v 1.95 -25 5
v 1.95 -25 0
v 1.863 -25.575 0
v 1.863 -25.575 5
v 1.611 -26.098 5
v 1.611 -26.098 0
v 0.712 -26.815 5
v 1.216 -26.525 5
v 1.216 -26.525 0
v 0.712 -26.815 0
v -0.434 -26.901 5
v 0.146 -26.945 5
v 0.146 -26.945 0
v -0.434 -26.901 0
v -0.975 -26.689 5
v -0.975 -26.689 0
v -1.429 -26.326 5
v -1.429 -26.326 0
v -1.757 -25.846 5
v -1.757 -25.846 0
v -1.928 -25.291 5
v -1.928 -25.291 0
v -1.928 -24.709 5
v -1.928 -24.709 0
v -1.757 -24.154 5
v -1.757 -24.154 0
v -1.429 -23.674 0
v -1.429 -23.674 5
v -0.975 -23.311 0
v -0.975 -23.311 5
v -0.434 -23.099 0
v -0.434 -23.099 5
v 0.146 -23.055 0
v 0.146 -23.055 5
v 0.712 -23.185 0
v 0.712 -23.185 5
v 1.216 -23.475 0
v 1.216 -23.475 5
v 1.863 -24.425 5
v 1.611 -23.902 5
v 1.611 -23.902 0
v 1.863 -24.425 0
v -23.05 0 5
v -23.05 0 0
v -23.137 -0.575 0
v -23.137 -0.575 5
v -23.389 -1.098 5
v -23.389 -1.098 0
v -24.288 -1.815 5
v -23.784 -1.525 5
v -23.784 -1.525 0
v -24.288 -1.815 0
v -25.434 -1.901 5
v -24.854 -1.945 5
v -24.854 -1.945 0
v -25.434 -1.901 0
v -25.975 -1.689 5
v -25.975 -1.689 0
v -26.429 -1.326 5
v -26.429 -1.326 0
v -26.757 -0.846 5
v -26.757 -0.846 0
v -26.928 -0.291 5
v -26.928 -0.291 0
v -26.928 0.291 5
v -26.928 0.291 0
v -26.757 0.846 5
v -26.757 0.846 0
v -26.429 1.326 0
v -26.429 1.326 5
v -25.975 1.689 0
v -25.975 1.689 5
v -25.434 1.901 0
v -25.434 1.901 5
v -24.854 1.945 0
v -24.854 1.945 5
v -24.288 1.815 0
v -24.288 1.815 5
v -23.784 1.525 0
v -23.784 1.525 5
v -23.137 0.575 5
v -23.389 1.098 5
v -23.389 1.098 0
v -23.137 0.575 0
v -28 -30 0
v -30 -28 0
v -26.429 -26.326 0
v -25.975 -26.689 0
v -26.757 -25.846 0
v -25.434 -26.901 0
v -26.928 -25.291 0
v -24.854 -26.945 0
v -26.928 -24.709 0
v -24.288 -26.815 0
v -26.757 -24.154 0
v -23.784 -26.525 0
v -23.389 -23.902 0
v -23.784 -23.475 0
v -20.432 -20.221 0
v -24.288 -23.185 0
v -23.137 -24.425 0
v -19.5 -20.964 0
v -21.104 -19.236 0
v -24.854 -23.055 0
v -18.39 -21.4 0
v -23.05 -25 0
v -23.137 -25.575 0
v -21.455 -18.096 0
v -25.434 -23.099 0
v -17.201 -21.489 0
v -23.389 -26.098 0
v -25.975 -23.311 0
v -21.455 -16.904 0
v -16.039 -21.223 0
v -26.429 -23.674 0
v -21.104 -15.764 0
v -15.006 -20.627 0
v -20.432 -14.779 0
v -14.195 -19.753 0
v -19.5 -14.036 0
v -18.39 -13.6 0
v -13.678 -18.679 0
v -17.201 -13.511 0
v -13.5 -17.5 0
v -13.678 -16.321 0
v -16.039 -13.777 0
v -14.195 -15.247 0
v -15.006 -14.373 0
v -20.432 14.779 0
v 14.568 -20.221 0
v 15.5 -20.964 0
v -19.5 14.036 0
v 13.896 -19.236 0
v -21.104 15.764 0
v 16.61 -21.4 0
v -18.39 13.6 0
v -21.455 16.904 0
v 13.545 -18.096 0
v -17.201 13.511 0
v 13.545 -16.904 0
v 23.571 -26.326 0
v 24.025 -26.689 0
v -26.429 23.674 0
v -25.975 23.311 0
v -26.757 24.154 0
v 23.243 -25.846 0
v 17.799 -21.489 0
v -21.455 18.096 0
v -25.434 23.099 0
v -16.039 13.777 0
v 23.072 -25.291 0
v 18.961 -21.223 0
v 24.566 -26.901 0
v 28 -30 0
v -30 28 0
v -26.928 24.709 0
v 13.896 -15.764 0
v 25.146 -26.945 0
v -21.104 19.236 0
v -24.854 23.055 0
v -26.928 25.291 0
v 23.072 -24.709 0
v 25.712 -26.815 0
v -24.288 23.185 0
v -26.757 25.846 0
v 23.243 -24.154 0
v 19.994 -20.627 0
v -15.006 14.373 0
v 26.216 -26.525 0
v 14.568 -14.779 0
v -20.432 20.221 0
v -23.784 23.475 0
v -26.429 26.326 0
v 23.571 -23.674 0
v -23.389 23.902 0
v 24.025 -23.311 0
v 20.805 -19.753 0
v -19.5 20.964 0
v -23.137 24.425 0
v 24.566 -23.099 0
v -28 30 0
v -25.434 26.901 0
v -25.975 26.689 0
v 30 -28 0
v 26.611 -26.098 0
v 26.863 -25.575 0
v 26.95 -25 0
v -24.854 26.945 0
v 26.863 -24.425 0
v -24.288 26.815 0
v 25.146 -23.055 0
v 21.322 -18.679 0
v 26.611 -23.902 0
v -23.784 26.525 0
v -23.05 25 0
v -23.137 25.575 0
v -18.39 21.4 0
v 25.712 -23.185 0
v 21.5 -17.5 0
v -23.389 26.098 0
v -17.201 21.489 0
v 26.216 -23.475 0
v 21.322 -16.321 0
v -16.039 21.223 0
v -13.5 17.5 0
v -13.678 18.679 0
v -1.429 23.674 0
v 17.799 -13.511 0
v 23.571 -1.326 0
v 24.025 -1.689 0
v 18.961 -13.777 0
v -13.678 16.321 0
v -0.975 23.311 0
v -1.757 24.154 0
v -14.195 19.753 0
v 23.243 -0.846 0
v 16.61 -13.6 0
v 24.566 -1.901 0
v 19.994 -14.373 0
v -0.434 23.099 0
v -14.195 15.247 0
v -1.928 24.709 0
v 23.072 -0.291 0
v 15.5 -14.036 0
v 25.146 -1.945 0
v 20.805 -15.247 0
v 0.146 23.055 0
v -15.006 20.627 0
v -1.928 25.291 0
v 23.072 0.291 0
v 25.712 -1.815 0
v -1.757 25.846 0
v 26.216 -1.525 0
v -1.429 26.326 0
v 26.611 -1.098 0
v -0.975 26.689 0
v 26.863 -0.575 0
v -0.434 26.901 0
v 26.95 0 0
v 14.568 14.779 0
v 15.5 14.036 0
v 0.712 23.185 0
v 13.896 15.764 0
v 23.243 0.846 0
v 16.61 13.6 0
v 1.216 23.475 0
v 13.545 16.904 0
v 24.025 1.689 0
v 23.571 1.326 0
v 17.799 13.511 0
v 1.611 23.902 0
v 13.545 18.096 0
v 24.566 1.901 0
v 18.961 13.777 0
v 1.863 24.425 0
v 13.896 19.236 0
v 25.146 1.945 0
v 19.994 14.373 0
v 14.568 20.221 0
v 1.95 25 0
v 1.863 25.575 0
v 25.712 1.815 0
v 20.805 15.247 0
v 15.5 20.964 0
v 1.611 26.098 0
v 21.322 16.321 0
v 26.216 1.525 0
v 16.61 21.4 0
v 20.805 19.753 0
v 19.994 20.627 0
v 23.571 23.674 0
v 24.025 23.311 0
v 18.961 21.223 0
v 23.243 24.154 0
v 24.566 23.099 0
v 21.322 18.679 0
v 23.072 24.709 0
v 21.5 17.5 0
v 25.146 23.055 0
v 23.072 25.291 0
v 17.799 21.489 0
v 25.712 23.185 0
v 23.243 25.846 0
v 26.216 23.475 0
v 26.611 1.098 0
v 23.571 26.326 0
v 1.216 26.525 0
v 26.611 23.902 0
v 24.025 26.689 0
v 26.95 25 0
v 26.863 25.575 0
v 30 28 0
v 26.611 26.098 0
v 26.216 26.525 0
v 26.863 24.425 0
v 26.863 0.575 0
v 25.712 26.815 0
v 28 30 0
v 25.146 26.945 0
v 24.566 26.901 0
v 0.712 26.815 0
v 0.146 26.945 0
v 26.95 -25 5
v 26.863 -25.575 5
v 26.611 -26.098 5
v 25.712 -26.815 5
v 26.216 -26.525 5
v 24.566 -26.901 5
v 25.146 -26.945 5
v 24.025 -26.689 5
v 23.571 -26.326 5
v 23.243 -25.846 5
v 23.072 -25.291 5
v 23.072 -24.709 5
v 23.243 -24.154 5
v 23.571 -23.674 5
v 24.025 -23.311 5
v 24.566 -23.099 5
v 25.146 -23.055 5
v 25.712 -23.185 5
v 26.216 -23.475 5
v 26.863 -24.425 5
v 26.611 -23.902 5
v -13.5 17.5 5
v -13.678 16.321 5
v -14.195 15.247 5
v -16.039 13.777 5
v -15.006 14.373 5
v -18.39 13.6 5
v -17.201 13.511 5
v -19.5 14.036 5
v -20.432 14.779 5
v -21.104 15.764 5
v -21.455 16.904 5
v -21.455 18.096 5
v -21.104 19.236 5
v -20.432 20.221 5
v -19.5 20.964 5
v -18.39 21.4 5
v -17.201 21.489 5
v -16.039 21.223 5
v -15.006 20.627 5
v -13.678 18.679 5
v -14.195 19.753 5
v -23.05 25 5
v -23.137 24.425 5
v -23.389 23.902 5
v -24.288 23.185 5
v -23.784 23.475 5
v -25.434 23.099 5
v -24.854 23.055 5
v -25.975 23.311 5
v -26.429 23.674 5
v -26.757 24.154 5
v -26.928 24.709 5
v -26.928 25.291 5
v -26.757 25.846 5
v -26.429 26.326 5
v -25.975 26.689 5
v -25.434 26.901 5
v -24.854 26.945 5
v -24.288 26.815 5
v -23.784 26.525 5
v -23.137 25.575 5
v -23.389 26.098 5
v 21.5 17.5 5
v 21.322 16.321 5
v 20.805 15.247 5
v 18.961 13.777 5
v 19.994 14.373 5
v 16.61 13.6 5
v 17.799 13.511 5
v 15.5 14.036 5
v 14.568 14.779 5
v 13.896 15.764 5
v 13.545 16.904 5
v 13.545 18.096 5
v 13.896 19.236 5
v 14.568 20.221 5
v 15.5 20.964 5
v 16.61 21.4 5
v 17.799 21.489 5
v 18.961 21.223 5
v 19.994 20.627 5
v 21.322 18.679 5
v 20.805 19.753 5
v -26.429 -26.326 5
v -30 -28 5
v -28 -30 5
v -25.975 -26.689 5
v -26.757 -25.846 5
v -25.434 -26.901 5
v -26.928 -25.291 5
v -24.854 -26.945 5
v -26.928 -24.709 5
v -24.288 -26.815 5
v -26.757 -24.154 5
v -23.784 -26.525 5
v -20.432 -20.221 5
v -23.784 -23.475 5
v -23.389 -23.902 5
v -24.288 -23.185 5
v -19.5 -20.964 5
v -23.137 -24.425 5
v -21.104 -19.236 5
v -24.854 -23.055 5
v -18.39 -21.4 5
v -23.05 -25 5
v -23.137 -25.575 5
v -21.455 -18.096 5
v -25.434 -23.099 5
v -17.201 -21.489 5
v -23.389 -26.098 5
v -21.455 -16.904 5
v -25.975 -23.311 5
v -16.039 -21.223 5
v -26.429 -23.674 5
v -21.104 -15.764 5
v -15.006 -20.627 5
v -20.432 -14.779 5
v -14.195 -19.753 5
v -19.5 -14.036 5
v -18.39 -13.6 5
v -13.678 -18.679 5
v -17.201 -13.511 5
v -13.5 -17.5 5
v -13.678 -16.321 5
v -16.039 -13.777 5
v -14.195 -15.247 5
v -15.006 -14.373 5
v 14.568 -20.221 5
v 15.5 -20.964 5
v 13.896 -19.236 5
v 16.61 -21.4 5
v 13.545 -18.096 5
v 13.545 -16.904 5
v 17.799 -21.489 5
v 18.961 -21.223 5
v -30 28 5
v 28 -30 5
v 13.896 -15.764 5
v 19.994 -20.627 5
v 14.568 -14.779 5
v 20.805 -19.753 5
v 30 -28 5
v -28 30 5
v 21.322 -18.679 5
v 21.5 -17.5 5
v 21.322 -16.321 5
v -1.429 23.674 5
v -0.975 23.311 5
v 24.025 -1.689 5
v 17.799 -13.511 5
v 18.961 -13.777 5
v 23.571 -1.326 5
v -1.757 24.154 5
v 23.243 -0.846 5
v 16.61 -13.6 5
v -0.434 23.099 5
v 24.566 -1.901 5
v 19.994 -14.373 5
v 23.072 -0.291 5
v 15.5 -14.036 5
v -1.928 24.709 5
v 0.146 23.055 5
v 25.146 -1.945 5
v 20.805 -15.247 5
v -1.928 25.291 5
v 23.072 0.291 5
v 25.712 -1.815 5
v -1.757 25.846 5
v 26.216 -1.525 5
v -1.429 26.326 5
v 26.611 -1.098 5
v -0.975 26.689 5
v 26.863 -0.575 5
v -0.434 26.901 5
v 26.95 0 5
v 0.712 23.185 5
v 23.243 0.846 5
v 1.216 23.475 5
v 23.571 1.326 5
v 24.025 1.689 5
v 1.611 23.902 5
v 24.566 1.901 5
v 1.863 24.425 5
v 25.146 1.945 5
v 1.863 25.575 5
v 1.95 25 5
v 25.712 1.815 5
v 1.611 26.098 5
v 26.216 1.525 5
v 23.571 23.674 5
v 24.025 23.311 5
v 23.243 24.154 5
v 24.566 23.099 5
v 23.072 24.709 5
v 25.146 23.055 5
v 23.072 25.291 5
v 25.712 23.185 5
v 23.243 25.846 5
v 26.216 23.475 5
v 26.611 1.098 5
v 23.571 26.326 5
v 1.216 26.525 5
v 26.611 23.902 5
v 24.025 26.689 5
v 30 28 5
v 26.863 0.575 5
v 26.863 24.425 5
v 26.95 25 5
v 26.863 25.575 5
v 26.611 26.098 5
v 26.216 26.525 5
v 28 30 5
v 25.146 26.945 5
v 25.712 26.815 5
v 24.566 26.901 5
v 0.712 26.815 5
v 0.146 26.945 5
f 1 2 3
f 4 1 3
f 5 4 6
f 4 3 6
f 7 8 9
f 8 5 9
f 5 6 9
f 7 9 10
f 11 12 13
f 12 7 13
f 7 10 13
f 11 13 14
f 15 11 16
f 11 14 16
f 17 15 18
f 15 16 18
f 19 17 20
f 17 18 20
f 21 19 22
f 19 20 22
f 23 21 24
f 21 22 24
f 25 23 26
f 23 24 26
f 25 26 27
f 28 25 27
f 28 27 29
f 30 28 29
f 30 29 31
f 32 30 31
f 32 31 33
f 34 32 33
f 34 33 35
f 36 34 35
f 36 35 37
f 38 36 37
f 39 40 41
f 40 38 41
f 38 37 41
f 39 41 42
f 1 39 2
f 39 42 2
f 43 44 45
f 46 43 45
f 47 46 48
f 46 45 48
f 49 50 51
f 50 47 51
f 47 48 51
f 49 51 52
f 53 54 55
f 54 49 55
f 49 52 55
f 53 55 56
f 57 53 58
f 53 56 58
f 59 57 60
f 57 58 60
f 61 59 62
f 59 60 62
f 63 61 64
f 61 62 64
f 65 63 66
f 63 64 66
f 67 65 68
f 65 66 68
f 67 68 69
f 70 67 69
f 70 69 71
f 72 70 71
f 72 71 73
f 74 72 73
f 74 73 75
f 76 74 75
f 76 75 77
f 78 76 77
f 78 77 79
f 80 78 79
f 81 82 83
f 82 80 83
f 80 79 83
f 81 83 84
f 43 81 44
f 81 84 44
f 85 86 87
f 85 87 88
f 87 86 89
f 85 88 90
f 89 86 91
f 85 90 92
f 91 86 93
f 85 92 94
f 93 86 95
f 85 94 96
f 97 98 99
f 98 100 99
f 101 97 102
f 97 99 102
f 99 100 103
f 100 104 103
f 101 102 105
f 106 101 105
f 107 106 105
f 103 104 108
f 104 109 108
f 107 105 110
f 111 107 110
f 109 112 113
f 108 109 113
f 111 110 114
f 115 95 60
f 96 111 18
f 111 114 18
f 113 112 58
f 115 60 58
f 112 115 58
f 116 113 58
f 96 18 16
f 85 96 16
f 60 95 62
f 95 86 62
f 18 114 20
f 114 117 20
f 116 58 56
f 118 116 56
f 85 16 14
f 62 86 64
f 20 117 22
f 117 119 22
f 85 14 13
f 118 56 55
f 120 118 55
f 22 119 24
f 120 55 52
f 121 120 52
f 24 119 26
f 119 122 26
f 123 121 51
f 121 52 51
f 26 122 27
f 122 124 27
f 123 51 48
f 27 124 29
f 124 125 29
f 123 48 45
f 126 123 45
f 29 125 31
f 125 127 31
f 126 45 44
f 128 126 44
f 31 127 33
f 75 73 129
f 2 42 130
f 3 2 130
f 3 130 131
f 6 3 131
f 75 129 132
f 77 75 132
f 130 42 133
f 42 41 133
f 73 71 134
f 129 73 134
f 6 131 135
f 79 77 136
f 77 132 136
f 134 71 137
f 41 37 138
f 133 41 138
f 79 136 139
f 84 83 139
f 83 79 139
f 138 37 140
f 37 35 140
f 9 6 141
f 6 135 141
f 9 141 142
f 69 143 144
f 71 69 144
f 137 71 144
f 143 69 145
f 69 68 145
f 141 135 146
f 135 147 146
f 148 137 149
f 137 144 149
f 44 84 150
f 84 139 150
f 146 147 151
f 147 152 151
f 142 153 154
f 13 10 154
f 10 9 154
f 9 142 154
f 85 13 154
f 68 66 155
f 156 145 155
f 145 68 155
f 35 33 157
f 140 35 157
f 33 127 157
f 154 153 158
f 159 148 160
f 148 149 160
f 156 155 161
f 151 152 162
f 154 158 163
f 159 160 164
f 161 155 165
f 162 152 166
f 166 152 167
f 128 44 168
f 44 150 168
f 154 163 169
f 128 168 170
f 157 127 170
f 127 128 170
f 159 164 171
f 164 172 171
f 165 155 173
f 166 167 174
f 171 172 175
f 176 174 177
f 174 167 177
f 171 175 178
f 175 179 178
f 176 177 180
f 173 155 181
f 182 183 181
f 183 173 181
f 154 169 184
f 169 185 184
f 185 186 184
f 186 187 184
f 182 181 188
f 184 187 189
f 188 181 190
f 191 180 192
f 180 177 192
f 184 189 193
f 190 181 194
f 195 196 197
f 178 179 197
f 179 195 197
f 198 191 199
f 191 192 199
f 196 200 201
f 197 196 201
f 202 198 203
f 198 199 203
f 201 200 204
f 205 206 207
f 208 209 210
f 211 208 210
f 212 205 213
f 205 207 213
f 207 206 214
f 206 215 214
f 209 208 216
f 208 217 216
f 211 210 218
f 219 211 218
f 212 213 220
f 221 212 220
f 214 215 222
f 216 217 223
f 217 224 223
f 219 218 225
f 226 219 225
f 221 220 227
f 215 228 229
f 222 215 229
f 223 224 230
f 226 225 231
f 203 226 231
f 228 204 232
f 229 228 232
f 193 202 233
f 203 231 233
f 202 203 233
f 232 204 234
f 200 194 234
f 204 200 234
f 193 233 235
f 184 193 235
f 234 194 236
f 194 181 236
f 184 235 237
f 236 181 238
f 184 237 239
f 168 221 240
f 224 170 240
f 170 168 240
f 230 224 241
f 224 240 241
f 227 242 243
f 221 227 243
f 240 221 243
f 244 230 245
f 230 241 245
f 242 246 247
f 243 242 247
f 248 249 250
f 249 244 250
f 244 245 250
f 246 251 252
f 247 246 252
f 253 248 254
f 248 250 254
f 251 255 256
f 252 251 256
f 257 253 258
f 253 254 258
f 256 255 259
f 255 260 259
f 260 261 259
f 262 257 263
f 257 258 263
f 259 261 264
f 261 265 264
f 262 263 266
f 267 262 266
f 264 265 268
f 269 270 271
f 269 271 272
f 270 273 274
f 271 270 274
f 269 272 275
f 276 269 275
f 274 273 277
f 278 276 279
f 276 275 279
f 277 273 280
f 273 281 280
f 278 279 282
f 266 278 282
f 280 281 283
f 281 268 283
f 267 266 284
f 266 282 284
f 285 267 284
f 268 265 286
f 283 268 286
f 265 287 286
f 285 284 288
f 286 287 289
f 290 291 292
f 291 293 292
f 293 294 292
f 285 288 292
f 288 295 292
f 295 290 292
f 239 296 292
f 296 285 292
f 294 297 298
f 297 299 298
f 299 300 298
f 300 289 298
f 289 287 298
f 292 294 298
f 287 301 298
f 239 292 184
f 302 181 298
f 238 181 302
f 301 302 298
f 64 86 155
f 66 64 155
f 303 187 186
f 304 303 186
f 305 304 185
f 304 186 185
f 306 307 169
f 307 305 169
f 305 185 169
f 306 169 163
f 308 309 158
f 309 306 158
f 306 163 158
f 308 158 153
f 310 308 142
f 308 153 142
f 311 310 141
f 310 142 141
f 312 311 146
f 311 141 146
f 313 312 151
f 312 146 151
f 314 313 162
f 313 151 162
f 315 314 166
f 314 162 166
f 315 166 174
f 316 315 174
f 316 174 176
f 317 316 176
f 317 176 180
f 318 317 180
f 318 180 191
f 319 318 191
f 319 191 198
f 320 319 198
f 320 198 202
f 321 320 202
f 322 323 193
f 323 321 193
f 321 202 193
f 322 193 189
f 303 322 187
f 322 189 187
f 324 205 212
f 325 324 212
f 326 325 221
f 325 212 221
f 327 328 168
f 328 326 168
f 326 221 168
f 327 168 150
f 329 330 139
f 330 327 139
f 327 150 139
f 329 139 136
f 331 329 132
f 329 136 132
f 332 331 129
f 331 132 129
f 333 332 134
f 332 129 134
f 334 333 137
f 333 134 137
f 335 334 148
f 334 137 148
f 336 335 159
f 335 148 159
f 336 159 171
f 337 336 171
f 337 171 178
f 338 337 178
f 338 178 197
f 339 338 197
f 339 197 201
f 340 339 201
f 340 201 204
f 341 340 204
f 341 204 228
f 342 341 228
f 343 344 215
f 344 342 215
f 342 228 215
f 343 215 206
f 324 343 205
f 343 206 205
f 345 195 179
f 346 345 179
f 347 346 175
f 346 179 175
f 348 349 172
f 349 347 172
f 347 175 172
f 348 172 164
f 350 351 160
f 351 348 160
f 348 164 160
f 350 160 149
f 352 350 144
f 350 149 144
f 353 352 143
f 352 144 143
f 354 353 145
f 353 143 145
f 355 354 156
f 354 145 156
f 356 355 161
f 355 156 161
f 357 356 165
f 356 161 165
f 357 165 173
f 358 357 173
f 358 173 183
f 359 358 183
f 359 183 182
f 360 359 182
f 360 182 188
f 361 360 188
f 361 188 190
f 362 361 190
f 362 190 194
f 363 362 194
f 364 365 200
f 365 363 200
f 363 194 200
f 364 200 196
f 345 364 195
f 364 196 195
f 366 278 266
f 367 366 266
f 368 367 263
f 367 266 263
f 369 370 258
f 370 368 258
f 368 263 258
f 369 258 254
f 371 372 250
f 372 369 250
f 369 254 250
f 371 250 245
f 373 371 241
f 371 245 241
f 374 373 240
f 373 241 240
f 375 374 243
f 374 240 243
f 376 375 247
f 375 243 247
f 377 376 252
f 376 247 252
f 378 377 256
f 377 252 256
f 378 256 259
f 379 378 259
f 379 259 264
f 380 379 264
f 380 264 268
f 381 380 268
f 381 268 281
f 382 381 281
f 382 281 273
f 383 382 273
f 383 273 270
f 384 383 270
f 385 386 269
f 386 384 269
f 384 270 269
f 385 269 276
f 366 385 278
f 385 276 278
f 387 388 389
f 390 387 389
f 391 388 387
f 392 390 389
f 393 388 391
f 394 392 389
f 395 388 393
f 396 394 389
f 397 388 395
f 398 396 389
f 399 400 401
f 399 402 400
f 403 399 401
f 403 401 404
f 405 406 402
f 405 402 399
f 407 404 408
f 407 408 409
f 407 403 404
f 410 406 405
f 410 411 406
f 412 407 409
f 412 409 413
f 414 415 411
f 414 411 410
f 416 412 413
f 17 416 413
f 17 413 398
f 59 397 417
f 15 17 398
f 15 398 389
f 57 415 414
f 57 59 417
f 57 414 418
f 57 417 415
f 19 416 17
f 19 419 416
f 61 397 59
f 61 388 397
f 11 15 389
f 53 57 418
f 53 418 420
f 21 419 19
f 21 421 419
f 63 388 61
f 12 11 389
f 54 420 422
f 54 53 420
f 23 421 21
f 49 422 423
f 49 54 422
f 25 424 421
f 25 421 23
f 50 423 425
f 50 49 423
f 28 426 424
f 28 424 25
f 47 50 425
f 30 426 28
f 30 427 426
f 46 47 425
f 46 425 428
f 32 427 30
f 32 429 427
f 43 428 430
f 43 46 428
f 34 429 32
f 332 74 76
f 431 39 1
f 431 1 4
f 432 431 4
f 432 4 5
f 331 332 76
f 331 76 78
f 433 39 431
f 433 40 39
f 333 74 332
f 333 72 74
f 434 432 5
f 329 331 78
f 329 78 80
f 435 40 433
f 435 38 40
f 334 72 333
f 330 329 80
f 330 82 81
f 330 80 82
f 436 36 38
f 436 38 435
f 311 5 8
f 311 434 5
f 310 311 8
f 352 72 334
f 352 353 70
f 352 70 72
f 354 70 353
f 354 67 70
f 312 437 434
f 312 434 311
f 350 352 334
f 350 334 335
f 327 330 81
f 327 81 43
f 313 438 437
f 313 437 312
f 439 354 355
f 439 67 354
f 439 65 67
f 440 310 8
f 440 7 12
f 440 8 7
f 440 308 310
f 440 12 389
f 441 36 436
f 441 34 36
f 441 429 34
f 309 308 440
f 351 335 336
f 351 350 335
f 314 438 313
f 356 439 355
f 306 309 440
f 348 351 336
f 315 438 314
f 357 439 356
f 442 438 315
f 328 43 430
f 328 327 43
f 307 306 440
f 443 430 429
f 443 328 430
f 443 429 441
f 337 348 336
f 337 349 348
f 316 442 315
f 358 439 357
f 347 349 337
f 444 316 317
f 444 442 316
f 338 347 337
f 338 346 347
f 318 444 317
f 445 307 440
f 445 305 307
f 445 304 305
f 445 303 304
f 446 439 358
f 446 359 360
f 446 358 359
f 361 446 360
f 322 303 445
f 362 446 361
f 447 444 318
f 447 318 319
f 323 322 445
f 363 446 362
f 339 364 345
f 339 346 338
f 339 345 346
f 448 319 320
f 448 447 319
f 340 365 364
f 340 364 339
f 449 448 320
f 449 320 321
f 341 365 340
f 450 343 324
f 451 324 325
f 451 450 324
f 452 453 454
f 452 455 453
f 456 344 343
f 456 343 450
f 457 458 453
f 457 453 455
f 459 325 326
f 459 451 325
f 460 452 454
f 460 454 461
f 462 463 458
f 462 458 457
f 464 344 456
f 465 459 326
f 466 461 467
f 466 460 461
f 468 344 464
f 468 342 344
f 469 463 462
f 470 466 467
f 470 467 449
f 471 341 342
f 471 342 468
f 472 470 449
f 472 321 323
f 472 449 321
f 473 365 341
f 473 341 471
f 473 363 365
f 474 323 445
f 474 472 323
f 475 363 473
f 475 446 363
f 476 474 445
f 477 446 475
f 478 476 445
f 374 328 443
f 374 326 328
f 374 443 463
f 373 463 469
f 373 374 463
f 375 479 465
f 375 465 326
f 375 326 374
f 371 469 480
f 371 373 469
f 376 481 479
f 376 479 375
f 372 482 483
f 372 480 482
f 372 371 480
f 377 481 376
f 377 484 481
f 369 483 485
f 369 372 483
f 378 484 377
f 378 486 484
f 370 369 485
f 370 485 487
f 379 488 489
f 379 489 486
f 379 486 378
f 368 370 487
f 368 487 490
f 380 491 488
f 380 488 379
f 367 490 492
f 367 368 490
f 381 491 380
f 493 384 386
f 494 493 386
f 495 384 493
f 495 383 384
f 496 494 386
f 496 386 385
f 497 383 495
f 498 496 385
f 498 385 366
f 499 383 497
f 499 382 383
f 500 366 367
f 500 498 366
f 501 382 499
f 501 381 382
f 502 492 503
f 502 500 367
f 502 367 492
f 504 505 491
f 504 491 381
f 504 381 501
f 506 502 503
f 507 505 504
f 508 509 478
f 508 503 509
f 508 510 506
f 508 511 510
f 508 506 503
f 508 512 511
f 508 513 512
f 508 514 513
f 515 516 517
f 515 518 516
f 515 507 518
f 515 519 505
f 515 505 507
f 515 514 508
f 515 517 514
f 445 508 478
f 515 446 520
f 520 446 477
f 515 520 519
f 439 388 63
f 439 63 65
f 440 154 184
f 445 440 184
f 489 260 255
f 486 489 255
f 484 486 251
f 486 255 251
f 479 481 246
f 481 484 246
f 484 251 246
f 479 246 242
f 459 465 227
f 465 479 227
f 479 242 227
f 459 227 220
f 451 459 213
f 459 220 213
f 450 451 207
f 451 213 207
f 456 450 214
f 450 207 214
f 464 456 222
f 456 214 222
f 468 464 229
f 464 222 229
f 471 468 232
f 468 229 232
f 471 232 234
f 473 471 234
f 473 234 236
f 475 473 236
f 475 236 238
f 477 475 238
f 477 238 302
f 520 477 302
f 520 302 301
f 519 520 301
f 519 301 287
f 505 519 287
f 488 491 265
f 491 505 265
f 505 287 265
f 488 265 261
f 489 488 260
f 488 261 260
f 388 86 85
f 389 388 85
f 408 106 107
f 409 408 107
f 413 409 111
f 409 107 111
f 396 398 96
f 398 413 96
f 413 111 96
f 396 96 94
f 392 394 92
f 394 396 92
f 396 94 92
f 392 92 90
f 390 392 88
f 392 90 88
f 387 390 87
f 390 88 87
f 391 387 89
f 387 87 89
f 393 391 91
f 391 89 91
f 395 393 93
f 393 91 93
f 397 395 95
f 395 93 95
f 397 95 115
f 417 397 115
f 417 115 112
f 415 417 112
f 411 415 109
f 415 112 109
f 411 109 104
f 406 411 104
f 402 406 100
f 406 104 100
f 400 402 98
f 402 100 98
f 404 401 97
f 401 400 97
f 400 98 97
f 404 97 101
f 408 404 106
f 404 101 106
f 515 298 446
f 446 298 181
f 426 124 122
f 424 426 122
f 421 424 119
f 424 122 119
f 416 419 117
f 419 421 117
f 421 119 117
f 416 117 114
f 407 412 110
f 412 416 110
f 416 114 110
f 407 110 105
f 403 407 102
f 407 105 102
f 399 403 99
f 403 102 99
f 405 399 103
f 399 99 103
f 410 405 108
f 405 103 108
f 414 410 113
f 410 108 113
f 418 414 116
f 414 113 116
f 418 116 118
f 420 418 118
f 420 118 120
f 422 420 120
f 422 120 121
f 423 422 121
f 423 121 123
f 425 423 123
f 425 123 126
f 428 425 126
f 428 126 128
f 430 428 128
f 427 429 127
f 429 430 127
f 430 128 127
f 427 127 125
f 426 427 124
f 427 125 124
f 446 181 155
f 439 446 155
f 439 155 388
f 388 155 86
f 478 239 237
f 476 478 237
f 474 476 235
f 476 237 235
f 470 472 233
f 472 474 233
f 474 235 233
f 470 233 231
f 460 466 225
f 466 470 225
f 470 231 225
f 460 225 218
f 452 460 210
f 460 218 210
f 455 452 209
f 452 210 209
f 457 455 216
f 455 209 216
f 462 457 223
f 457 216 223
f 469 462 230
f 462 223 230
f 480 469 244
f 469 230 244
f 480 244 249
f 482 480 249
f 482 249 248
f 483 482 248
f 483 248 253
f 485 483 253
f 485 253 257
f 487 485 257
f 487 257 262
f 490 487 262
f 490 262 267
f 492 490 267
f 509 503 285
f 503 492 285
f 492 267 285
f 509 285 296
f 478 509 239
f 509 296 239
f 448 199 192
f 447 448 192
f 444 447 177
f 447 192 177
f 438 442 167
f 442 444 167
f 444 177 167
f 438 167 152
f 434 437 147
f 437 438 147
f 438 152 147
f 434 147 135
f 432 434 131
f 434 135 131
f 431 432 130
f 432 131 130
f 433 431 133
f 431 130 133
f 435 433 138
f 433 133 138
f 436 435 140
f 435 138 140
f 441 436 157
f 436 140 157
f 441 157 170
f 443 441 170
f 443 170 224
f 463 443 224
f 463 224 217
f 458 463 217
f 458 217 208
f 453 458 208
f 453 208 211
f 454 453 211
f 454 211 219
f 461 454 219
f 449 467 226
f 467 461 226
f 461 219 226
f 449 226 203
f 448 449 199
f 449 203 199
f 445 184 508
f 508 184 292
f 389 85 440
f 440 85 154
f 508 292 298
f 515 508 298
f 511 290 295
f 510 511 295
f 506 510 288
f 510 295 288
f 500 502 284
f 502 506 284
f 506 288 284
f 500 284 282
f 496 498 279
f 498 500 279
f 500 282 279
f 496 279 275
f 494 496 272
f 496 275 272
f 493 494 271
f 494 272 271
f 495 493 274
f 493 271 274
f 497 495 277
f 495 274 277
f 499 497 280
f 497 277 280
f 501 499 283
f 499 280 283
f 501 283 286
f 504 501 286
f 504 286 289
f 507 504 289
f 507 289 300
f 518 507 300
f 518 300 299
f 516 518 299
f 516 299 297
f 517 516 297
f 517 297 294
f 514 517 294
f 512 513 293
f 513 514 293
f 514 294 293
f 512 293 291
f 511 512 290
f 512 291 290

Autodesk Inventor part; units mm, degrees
ref_plane "YZ Plane" through (0, 0, 0) normal (1, 0, 0) x (0, 1, 0)
ref_plane "XZ Plane" through (0, 0, 0) normal (0, 1, 0) x (-1, 0, 0)
ref_plane "XY Plane" through (0, 0, 0) normal (0, 0, 1) x (1, 0, 0)
sketch "Sketch1" plane through (0, 0, 0) normal (0, 0, 1) x (1, 0, 0)
  line L0 (100.1576, -44) -> (109, -35.1576) projected
  line L1 (109, -35.1576) -> (109, 35) projected
  line L2 (109, 35) -> (41.05, 35) projected
  line L3 (41.05, 35) -> (28, 30) projected
  line L4 (28, 30) -> (-28, 30) projected
  line L5 (-28, 30) -> (-30, 28) projected
  line L6 (-30, 28) -> (-30, -28) projected
  line L7 (-30, -28) -> (-28, -30) projected
  line L8 (-28, -30) -> (28, -30) projected
  line L9 (28, -30) -> (90.0667, -30) projected
  line L10 (90.0667, -30) -> (90.0667, -44) projected
  line L11 (90.0667, -44) -> (100.1576, -44) projected
  circle A0 centre (101, -8.23) radius 1.6 projected
  circle A1 centre (101, 1.77) radius 1.6 projected
  circle A2 centre (101, 29.77) radius 1.6 projected
  circle A3 centre (85, 29.77) radius 1.6 projected
  circle A4 centre (85, 1.77) radius 1.6 projected
  circle A5 centre (85, -8.23) radius 1.6 projected
  circle A6 centre (64.15, 11.27) radius 1.6 projected
  circle A7 centre (47.85, 11.27) radius 1.6 projected
  circle A8 centre (25, 0) radius 1.95 projected
  circle A9 centre (0, 25) radius 1.95 projected
  circle A10 centre (-25, -25) radius 1.95 projected
  circle A11 centre (25, 25) radius 1.95 projected
  circle A12 centre (-25, 25) radius 1.95 projected
  circle A13 centre (25, -25) radius 1.95 projected
  circle A14 centre (0, -25) radius 1.95 projected
  circle A15 centre (-25, 0) radius 1.95 projected
  circle A16 centre (-17.5, 17.5) radius 4 projected
  circle A17 centre (17.5, -17.5) radius 4 projected
  circle A18 centre (-17.5, -17.5) radius 4 projected
  circle A19 centre (17.5, 17.5) radius 4 projected
  line L12 (30, 28) -> (28, 30) projected
  line L13 (30, -28) -> (30, 28) projected
  line L14 (28, -30) -> (30, -28) projected
  point P0 (0, 0)
extrude "Extrusion1" add sketch "Sketch1" along normal blind 5 contours L8 L7 L6 L5 L4 L12 L13 L14
properties part number "cellSTORM_v5_spacer_xy_stage"
